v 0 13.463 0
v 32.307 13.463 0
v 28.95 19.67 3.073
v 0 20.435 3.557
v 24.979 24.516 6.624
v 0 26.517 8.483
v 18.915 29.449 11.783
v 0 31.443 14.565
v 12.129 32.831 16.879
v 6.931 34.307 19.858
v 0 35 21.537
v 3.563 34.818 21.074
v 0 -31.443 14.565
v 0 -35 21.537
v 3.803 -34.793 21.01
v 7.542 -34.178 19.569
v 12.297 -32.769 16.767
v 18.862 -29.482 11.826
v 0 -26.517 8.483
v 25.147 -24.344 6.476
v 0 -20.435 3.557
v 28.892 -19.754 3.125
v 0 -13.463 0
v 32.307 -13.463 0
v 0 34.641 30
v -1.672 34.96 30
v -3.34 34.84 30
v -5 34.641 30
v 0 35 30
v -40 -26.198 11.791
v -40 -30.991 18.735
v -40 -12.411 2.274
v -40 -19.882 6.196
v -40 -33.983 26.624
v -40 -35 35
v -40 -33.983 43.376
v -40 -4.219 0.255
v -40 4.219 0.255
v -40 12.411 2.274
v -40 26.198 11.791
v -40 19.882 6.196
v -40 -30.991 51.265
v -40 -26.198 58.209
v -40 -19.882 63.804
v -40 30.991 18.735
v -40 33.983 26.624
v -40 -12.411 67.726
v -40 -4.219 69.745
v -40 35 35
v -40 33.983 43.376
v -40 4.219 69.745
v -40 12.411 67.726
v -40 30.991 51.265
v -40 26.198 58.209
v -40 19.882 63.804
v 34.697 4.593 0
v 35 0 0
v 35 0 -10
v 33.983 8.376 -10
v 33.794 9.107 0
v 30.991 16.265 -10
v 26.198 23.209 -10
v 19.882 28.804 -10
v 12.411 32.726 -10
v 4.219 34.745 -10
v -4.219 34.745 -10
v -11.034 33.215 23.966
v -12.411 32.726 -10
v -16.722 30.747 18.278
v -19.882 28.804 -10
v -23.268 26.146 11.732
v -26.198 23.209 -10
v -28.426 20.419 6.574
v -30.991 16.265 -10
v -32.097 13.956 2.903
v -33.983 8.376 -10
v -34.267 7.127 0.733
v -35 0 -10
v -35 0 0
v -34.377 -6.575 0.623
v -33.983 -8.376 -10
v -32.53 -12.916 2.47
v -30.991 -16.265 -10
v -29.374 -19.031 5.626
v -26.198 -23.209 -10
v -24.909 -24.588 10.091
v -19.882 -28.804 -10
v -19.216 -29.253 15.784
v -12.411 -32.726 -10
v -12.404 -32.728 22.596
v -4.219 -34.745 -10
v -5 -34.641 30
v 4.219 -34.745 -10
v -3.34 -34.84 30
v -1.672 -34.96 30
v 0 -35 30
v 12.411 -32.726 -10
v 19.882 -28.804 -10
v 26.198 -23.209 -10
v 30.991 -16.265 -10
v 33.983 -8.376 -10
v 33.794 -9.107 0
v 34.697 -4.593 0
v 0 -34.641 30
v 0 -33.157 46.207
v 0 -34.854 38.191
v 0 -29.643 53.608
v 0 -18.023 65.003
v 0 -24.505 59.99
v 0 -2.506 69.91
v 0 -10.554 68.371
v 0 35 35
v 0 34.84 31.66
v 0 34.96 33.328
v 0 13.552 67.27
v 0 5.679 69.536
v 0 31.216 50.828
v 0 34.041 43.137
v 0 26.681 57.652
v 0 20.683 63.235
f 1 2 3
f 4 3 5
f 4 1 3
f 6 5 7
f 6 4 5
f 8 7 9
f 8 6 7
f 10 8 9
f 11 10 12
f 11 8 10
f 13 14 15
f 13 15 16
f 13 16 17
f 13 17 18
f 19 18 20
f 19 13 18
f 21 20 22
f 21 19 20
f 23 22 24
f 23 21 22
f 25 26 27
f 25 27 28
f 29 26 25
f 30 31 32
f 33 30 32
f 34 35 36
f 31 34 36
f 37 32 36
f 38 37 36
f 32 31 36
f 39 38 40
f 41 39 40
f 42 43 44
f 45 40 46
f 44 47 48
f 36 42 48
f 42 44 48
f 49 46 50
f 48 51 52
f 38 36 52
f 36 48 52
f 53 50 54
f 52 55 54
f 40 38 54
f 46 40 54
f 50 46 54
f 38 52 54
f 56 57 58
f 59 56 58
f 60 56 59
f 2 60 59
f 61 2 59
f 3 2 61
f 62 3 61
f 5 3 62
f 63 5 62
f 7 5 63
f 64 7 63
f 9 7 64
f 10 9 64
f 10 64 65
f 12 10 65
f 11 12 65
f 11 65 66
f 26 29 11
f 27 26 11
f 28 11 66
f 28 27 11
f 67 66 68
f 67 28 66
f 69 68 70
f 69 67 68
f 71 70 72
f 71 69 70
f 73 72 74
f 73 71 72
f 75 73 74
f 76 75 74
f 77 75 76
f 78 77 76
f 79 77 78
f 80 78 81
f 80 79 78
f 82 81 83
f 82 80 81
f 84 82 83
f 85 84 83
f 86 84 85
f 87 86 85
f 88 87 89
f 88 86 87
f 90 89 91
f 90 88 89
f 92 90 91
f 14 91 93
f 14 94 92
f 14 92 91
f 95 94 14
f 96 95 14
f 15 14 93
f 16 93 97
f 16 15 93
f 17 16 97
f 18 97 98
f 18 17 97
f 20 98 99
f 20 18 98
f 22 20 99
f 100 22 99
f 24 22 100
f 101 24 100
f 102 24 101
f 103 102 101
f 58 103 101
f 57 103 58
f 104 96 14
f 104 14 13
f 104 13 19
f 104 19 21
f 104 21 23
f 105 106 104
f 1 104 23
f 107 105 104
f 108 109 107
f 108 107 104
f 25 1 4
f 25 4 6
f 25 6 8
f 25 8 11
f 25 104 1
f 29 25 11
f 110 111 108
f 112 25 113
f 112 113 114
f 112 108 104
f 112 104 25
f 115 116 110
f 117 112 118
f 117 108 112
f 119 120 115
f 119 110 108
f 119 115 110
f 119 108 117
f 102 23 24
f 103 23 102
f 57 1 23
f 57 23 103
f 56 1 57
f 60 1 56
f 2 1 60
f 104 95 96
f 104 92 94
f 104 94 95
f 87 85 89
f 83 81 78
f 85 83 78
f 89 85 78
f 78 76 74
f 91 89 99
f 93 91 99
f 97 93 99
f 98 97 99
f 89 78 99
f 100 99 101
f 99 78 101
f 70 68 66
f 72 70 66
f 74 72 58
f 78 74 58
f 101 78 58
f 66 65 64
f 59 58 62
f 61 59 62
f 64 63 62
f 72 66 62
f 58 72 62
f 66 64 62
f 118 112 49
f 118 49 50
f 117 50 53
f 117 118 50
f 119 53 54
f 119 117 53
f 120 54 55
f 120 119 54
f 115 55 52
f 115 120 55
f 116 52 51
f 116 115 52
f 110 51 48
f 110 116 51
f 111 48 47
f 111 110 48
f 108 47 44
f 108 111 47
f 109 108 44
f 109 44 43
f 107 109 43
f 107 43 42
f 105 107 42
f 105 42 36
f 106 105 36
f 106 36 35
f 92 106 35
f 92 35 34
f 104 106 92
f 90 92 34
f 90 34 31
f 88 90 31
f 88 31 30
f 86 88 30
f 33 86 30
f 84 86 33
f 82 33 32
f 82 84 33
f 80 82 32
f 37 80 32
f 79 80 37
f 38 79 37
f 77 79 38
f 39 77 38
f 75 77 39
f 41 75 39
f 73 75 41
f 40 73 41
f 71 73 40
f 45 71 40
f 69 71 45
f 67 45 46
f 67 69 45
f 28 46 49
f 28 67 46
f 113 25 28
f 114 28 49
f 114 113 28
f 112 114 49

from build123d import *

# Parameters (mm, degrees)
SKETCH_R     = 35
PAD_DEPTH    = 30
SKETCH001_R  = 35
PAD001_DEPTH = 40
SKETCH002_R  = 37.5
POCKET_DEPTH = 35
PAD002_DEPTH = 10


with BuildPart() as part:
    # Sketch → Pad (new body)
    with BuildSketch(Plane.XY):
        Circle(SKETCH_R)
    extrude(amount=PAD_DEPTH)

    # Sketch001 → Pad001 (join)
    with BuildSketch(Plane.YZ):
        with Locations((0, 35)):
            Circle(SKETCH001_R)
    extrude(amount=-PAD001_DEPTH)

    # Sketch002 → Pocket (cut)
    with BuildSketch(Plane.YZ):
        with Locations((0, 35)):
            Circle(SKETCH002_R)
    extrude(amount=POCKET_DEPTH, mode=Mode.SUBTRACT)

    # Sketch → Pad002 (join)
    with BuildSketch(Plane.XY):
        Circle(SKETCH_R)
    extrude(amount=-PAD002_DEPTH)


solid = part.part
